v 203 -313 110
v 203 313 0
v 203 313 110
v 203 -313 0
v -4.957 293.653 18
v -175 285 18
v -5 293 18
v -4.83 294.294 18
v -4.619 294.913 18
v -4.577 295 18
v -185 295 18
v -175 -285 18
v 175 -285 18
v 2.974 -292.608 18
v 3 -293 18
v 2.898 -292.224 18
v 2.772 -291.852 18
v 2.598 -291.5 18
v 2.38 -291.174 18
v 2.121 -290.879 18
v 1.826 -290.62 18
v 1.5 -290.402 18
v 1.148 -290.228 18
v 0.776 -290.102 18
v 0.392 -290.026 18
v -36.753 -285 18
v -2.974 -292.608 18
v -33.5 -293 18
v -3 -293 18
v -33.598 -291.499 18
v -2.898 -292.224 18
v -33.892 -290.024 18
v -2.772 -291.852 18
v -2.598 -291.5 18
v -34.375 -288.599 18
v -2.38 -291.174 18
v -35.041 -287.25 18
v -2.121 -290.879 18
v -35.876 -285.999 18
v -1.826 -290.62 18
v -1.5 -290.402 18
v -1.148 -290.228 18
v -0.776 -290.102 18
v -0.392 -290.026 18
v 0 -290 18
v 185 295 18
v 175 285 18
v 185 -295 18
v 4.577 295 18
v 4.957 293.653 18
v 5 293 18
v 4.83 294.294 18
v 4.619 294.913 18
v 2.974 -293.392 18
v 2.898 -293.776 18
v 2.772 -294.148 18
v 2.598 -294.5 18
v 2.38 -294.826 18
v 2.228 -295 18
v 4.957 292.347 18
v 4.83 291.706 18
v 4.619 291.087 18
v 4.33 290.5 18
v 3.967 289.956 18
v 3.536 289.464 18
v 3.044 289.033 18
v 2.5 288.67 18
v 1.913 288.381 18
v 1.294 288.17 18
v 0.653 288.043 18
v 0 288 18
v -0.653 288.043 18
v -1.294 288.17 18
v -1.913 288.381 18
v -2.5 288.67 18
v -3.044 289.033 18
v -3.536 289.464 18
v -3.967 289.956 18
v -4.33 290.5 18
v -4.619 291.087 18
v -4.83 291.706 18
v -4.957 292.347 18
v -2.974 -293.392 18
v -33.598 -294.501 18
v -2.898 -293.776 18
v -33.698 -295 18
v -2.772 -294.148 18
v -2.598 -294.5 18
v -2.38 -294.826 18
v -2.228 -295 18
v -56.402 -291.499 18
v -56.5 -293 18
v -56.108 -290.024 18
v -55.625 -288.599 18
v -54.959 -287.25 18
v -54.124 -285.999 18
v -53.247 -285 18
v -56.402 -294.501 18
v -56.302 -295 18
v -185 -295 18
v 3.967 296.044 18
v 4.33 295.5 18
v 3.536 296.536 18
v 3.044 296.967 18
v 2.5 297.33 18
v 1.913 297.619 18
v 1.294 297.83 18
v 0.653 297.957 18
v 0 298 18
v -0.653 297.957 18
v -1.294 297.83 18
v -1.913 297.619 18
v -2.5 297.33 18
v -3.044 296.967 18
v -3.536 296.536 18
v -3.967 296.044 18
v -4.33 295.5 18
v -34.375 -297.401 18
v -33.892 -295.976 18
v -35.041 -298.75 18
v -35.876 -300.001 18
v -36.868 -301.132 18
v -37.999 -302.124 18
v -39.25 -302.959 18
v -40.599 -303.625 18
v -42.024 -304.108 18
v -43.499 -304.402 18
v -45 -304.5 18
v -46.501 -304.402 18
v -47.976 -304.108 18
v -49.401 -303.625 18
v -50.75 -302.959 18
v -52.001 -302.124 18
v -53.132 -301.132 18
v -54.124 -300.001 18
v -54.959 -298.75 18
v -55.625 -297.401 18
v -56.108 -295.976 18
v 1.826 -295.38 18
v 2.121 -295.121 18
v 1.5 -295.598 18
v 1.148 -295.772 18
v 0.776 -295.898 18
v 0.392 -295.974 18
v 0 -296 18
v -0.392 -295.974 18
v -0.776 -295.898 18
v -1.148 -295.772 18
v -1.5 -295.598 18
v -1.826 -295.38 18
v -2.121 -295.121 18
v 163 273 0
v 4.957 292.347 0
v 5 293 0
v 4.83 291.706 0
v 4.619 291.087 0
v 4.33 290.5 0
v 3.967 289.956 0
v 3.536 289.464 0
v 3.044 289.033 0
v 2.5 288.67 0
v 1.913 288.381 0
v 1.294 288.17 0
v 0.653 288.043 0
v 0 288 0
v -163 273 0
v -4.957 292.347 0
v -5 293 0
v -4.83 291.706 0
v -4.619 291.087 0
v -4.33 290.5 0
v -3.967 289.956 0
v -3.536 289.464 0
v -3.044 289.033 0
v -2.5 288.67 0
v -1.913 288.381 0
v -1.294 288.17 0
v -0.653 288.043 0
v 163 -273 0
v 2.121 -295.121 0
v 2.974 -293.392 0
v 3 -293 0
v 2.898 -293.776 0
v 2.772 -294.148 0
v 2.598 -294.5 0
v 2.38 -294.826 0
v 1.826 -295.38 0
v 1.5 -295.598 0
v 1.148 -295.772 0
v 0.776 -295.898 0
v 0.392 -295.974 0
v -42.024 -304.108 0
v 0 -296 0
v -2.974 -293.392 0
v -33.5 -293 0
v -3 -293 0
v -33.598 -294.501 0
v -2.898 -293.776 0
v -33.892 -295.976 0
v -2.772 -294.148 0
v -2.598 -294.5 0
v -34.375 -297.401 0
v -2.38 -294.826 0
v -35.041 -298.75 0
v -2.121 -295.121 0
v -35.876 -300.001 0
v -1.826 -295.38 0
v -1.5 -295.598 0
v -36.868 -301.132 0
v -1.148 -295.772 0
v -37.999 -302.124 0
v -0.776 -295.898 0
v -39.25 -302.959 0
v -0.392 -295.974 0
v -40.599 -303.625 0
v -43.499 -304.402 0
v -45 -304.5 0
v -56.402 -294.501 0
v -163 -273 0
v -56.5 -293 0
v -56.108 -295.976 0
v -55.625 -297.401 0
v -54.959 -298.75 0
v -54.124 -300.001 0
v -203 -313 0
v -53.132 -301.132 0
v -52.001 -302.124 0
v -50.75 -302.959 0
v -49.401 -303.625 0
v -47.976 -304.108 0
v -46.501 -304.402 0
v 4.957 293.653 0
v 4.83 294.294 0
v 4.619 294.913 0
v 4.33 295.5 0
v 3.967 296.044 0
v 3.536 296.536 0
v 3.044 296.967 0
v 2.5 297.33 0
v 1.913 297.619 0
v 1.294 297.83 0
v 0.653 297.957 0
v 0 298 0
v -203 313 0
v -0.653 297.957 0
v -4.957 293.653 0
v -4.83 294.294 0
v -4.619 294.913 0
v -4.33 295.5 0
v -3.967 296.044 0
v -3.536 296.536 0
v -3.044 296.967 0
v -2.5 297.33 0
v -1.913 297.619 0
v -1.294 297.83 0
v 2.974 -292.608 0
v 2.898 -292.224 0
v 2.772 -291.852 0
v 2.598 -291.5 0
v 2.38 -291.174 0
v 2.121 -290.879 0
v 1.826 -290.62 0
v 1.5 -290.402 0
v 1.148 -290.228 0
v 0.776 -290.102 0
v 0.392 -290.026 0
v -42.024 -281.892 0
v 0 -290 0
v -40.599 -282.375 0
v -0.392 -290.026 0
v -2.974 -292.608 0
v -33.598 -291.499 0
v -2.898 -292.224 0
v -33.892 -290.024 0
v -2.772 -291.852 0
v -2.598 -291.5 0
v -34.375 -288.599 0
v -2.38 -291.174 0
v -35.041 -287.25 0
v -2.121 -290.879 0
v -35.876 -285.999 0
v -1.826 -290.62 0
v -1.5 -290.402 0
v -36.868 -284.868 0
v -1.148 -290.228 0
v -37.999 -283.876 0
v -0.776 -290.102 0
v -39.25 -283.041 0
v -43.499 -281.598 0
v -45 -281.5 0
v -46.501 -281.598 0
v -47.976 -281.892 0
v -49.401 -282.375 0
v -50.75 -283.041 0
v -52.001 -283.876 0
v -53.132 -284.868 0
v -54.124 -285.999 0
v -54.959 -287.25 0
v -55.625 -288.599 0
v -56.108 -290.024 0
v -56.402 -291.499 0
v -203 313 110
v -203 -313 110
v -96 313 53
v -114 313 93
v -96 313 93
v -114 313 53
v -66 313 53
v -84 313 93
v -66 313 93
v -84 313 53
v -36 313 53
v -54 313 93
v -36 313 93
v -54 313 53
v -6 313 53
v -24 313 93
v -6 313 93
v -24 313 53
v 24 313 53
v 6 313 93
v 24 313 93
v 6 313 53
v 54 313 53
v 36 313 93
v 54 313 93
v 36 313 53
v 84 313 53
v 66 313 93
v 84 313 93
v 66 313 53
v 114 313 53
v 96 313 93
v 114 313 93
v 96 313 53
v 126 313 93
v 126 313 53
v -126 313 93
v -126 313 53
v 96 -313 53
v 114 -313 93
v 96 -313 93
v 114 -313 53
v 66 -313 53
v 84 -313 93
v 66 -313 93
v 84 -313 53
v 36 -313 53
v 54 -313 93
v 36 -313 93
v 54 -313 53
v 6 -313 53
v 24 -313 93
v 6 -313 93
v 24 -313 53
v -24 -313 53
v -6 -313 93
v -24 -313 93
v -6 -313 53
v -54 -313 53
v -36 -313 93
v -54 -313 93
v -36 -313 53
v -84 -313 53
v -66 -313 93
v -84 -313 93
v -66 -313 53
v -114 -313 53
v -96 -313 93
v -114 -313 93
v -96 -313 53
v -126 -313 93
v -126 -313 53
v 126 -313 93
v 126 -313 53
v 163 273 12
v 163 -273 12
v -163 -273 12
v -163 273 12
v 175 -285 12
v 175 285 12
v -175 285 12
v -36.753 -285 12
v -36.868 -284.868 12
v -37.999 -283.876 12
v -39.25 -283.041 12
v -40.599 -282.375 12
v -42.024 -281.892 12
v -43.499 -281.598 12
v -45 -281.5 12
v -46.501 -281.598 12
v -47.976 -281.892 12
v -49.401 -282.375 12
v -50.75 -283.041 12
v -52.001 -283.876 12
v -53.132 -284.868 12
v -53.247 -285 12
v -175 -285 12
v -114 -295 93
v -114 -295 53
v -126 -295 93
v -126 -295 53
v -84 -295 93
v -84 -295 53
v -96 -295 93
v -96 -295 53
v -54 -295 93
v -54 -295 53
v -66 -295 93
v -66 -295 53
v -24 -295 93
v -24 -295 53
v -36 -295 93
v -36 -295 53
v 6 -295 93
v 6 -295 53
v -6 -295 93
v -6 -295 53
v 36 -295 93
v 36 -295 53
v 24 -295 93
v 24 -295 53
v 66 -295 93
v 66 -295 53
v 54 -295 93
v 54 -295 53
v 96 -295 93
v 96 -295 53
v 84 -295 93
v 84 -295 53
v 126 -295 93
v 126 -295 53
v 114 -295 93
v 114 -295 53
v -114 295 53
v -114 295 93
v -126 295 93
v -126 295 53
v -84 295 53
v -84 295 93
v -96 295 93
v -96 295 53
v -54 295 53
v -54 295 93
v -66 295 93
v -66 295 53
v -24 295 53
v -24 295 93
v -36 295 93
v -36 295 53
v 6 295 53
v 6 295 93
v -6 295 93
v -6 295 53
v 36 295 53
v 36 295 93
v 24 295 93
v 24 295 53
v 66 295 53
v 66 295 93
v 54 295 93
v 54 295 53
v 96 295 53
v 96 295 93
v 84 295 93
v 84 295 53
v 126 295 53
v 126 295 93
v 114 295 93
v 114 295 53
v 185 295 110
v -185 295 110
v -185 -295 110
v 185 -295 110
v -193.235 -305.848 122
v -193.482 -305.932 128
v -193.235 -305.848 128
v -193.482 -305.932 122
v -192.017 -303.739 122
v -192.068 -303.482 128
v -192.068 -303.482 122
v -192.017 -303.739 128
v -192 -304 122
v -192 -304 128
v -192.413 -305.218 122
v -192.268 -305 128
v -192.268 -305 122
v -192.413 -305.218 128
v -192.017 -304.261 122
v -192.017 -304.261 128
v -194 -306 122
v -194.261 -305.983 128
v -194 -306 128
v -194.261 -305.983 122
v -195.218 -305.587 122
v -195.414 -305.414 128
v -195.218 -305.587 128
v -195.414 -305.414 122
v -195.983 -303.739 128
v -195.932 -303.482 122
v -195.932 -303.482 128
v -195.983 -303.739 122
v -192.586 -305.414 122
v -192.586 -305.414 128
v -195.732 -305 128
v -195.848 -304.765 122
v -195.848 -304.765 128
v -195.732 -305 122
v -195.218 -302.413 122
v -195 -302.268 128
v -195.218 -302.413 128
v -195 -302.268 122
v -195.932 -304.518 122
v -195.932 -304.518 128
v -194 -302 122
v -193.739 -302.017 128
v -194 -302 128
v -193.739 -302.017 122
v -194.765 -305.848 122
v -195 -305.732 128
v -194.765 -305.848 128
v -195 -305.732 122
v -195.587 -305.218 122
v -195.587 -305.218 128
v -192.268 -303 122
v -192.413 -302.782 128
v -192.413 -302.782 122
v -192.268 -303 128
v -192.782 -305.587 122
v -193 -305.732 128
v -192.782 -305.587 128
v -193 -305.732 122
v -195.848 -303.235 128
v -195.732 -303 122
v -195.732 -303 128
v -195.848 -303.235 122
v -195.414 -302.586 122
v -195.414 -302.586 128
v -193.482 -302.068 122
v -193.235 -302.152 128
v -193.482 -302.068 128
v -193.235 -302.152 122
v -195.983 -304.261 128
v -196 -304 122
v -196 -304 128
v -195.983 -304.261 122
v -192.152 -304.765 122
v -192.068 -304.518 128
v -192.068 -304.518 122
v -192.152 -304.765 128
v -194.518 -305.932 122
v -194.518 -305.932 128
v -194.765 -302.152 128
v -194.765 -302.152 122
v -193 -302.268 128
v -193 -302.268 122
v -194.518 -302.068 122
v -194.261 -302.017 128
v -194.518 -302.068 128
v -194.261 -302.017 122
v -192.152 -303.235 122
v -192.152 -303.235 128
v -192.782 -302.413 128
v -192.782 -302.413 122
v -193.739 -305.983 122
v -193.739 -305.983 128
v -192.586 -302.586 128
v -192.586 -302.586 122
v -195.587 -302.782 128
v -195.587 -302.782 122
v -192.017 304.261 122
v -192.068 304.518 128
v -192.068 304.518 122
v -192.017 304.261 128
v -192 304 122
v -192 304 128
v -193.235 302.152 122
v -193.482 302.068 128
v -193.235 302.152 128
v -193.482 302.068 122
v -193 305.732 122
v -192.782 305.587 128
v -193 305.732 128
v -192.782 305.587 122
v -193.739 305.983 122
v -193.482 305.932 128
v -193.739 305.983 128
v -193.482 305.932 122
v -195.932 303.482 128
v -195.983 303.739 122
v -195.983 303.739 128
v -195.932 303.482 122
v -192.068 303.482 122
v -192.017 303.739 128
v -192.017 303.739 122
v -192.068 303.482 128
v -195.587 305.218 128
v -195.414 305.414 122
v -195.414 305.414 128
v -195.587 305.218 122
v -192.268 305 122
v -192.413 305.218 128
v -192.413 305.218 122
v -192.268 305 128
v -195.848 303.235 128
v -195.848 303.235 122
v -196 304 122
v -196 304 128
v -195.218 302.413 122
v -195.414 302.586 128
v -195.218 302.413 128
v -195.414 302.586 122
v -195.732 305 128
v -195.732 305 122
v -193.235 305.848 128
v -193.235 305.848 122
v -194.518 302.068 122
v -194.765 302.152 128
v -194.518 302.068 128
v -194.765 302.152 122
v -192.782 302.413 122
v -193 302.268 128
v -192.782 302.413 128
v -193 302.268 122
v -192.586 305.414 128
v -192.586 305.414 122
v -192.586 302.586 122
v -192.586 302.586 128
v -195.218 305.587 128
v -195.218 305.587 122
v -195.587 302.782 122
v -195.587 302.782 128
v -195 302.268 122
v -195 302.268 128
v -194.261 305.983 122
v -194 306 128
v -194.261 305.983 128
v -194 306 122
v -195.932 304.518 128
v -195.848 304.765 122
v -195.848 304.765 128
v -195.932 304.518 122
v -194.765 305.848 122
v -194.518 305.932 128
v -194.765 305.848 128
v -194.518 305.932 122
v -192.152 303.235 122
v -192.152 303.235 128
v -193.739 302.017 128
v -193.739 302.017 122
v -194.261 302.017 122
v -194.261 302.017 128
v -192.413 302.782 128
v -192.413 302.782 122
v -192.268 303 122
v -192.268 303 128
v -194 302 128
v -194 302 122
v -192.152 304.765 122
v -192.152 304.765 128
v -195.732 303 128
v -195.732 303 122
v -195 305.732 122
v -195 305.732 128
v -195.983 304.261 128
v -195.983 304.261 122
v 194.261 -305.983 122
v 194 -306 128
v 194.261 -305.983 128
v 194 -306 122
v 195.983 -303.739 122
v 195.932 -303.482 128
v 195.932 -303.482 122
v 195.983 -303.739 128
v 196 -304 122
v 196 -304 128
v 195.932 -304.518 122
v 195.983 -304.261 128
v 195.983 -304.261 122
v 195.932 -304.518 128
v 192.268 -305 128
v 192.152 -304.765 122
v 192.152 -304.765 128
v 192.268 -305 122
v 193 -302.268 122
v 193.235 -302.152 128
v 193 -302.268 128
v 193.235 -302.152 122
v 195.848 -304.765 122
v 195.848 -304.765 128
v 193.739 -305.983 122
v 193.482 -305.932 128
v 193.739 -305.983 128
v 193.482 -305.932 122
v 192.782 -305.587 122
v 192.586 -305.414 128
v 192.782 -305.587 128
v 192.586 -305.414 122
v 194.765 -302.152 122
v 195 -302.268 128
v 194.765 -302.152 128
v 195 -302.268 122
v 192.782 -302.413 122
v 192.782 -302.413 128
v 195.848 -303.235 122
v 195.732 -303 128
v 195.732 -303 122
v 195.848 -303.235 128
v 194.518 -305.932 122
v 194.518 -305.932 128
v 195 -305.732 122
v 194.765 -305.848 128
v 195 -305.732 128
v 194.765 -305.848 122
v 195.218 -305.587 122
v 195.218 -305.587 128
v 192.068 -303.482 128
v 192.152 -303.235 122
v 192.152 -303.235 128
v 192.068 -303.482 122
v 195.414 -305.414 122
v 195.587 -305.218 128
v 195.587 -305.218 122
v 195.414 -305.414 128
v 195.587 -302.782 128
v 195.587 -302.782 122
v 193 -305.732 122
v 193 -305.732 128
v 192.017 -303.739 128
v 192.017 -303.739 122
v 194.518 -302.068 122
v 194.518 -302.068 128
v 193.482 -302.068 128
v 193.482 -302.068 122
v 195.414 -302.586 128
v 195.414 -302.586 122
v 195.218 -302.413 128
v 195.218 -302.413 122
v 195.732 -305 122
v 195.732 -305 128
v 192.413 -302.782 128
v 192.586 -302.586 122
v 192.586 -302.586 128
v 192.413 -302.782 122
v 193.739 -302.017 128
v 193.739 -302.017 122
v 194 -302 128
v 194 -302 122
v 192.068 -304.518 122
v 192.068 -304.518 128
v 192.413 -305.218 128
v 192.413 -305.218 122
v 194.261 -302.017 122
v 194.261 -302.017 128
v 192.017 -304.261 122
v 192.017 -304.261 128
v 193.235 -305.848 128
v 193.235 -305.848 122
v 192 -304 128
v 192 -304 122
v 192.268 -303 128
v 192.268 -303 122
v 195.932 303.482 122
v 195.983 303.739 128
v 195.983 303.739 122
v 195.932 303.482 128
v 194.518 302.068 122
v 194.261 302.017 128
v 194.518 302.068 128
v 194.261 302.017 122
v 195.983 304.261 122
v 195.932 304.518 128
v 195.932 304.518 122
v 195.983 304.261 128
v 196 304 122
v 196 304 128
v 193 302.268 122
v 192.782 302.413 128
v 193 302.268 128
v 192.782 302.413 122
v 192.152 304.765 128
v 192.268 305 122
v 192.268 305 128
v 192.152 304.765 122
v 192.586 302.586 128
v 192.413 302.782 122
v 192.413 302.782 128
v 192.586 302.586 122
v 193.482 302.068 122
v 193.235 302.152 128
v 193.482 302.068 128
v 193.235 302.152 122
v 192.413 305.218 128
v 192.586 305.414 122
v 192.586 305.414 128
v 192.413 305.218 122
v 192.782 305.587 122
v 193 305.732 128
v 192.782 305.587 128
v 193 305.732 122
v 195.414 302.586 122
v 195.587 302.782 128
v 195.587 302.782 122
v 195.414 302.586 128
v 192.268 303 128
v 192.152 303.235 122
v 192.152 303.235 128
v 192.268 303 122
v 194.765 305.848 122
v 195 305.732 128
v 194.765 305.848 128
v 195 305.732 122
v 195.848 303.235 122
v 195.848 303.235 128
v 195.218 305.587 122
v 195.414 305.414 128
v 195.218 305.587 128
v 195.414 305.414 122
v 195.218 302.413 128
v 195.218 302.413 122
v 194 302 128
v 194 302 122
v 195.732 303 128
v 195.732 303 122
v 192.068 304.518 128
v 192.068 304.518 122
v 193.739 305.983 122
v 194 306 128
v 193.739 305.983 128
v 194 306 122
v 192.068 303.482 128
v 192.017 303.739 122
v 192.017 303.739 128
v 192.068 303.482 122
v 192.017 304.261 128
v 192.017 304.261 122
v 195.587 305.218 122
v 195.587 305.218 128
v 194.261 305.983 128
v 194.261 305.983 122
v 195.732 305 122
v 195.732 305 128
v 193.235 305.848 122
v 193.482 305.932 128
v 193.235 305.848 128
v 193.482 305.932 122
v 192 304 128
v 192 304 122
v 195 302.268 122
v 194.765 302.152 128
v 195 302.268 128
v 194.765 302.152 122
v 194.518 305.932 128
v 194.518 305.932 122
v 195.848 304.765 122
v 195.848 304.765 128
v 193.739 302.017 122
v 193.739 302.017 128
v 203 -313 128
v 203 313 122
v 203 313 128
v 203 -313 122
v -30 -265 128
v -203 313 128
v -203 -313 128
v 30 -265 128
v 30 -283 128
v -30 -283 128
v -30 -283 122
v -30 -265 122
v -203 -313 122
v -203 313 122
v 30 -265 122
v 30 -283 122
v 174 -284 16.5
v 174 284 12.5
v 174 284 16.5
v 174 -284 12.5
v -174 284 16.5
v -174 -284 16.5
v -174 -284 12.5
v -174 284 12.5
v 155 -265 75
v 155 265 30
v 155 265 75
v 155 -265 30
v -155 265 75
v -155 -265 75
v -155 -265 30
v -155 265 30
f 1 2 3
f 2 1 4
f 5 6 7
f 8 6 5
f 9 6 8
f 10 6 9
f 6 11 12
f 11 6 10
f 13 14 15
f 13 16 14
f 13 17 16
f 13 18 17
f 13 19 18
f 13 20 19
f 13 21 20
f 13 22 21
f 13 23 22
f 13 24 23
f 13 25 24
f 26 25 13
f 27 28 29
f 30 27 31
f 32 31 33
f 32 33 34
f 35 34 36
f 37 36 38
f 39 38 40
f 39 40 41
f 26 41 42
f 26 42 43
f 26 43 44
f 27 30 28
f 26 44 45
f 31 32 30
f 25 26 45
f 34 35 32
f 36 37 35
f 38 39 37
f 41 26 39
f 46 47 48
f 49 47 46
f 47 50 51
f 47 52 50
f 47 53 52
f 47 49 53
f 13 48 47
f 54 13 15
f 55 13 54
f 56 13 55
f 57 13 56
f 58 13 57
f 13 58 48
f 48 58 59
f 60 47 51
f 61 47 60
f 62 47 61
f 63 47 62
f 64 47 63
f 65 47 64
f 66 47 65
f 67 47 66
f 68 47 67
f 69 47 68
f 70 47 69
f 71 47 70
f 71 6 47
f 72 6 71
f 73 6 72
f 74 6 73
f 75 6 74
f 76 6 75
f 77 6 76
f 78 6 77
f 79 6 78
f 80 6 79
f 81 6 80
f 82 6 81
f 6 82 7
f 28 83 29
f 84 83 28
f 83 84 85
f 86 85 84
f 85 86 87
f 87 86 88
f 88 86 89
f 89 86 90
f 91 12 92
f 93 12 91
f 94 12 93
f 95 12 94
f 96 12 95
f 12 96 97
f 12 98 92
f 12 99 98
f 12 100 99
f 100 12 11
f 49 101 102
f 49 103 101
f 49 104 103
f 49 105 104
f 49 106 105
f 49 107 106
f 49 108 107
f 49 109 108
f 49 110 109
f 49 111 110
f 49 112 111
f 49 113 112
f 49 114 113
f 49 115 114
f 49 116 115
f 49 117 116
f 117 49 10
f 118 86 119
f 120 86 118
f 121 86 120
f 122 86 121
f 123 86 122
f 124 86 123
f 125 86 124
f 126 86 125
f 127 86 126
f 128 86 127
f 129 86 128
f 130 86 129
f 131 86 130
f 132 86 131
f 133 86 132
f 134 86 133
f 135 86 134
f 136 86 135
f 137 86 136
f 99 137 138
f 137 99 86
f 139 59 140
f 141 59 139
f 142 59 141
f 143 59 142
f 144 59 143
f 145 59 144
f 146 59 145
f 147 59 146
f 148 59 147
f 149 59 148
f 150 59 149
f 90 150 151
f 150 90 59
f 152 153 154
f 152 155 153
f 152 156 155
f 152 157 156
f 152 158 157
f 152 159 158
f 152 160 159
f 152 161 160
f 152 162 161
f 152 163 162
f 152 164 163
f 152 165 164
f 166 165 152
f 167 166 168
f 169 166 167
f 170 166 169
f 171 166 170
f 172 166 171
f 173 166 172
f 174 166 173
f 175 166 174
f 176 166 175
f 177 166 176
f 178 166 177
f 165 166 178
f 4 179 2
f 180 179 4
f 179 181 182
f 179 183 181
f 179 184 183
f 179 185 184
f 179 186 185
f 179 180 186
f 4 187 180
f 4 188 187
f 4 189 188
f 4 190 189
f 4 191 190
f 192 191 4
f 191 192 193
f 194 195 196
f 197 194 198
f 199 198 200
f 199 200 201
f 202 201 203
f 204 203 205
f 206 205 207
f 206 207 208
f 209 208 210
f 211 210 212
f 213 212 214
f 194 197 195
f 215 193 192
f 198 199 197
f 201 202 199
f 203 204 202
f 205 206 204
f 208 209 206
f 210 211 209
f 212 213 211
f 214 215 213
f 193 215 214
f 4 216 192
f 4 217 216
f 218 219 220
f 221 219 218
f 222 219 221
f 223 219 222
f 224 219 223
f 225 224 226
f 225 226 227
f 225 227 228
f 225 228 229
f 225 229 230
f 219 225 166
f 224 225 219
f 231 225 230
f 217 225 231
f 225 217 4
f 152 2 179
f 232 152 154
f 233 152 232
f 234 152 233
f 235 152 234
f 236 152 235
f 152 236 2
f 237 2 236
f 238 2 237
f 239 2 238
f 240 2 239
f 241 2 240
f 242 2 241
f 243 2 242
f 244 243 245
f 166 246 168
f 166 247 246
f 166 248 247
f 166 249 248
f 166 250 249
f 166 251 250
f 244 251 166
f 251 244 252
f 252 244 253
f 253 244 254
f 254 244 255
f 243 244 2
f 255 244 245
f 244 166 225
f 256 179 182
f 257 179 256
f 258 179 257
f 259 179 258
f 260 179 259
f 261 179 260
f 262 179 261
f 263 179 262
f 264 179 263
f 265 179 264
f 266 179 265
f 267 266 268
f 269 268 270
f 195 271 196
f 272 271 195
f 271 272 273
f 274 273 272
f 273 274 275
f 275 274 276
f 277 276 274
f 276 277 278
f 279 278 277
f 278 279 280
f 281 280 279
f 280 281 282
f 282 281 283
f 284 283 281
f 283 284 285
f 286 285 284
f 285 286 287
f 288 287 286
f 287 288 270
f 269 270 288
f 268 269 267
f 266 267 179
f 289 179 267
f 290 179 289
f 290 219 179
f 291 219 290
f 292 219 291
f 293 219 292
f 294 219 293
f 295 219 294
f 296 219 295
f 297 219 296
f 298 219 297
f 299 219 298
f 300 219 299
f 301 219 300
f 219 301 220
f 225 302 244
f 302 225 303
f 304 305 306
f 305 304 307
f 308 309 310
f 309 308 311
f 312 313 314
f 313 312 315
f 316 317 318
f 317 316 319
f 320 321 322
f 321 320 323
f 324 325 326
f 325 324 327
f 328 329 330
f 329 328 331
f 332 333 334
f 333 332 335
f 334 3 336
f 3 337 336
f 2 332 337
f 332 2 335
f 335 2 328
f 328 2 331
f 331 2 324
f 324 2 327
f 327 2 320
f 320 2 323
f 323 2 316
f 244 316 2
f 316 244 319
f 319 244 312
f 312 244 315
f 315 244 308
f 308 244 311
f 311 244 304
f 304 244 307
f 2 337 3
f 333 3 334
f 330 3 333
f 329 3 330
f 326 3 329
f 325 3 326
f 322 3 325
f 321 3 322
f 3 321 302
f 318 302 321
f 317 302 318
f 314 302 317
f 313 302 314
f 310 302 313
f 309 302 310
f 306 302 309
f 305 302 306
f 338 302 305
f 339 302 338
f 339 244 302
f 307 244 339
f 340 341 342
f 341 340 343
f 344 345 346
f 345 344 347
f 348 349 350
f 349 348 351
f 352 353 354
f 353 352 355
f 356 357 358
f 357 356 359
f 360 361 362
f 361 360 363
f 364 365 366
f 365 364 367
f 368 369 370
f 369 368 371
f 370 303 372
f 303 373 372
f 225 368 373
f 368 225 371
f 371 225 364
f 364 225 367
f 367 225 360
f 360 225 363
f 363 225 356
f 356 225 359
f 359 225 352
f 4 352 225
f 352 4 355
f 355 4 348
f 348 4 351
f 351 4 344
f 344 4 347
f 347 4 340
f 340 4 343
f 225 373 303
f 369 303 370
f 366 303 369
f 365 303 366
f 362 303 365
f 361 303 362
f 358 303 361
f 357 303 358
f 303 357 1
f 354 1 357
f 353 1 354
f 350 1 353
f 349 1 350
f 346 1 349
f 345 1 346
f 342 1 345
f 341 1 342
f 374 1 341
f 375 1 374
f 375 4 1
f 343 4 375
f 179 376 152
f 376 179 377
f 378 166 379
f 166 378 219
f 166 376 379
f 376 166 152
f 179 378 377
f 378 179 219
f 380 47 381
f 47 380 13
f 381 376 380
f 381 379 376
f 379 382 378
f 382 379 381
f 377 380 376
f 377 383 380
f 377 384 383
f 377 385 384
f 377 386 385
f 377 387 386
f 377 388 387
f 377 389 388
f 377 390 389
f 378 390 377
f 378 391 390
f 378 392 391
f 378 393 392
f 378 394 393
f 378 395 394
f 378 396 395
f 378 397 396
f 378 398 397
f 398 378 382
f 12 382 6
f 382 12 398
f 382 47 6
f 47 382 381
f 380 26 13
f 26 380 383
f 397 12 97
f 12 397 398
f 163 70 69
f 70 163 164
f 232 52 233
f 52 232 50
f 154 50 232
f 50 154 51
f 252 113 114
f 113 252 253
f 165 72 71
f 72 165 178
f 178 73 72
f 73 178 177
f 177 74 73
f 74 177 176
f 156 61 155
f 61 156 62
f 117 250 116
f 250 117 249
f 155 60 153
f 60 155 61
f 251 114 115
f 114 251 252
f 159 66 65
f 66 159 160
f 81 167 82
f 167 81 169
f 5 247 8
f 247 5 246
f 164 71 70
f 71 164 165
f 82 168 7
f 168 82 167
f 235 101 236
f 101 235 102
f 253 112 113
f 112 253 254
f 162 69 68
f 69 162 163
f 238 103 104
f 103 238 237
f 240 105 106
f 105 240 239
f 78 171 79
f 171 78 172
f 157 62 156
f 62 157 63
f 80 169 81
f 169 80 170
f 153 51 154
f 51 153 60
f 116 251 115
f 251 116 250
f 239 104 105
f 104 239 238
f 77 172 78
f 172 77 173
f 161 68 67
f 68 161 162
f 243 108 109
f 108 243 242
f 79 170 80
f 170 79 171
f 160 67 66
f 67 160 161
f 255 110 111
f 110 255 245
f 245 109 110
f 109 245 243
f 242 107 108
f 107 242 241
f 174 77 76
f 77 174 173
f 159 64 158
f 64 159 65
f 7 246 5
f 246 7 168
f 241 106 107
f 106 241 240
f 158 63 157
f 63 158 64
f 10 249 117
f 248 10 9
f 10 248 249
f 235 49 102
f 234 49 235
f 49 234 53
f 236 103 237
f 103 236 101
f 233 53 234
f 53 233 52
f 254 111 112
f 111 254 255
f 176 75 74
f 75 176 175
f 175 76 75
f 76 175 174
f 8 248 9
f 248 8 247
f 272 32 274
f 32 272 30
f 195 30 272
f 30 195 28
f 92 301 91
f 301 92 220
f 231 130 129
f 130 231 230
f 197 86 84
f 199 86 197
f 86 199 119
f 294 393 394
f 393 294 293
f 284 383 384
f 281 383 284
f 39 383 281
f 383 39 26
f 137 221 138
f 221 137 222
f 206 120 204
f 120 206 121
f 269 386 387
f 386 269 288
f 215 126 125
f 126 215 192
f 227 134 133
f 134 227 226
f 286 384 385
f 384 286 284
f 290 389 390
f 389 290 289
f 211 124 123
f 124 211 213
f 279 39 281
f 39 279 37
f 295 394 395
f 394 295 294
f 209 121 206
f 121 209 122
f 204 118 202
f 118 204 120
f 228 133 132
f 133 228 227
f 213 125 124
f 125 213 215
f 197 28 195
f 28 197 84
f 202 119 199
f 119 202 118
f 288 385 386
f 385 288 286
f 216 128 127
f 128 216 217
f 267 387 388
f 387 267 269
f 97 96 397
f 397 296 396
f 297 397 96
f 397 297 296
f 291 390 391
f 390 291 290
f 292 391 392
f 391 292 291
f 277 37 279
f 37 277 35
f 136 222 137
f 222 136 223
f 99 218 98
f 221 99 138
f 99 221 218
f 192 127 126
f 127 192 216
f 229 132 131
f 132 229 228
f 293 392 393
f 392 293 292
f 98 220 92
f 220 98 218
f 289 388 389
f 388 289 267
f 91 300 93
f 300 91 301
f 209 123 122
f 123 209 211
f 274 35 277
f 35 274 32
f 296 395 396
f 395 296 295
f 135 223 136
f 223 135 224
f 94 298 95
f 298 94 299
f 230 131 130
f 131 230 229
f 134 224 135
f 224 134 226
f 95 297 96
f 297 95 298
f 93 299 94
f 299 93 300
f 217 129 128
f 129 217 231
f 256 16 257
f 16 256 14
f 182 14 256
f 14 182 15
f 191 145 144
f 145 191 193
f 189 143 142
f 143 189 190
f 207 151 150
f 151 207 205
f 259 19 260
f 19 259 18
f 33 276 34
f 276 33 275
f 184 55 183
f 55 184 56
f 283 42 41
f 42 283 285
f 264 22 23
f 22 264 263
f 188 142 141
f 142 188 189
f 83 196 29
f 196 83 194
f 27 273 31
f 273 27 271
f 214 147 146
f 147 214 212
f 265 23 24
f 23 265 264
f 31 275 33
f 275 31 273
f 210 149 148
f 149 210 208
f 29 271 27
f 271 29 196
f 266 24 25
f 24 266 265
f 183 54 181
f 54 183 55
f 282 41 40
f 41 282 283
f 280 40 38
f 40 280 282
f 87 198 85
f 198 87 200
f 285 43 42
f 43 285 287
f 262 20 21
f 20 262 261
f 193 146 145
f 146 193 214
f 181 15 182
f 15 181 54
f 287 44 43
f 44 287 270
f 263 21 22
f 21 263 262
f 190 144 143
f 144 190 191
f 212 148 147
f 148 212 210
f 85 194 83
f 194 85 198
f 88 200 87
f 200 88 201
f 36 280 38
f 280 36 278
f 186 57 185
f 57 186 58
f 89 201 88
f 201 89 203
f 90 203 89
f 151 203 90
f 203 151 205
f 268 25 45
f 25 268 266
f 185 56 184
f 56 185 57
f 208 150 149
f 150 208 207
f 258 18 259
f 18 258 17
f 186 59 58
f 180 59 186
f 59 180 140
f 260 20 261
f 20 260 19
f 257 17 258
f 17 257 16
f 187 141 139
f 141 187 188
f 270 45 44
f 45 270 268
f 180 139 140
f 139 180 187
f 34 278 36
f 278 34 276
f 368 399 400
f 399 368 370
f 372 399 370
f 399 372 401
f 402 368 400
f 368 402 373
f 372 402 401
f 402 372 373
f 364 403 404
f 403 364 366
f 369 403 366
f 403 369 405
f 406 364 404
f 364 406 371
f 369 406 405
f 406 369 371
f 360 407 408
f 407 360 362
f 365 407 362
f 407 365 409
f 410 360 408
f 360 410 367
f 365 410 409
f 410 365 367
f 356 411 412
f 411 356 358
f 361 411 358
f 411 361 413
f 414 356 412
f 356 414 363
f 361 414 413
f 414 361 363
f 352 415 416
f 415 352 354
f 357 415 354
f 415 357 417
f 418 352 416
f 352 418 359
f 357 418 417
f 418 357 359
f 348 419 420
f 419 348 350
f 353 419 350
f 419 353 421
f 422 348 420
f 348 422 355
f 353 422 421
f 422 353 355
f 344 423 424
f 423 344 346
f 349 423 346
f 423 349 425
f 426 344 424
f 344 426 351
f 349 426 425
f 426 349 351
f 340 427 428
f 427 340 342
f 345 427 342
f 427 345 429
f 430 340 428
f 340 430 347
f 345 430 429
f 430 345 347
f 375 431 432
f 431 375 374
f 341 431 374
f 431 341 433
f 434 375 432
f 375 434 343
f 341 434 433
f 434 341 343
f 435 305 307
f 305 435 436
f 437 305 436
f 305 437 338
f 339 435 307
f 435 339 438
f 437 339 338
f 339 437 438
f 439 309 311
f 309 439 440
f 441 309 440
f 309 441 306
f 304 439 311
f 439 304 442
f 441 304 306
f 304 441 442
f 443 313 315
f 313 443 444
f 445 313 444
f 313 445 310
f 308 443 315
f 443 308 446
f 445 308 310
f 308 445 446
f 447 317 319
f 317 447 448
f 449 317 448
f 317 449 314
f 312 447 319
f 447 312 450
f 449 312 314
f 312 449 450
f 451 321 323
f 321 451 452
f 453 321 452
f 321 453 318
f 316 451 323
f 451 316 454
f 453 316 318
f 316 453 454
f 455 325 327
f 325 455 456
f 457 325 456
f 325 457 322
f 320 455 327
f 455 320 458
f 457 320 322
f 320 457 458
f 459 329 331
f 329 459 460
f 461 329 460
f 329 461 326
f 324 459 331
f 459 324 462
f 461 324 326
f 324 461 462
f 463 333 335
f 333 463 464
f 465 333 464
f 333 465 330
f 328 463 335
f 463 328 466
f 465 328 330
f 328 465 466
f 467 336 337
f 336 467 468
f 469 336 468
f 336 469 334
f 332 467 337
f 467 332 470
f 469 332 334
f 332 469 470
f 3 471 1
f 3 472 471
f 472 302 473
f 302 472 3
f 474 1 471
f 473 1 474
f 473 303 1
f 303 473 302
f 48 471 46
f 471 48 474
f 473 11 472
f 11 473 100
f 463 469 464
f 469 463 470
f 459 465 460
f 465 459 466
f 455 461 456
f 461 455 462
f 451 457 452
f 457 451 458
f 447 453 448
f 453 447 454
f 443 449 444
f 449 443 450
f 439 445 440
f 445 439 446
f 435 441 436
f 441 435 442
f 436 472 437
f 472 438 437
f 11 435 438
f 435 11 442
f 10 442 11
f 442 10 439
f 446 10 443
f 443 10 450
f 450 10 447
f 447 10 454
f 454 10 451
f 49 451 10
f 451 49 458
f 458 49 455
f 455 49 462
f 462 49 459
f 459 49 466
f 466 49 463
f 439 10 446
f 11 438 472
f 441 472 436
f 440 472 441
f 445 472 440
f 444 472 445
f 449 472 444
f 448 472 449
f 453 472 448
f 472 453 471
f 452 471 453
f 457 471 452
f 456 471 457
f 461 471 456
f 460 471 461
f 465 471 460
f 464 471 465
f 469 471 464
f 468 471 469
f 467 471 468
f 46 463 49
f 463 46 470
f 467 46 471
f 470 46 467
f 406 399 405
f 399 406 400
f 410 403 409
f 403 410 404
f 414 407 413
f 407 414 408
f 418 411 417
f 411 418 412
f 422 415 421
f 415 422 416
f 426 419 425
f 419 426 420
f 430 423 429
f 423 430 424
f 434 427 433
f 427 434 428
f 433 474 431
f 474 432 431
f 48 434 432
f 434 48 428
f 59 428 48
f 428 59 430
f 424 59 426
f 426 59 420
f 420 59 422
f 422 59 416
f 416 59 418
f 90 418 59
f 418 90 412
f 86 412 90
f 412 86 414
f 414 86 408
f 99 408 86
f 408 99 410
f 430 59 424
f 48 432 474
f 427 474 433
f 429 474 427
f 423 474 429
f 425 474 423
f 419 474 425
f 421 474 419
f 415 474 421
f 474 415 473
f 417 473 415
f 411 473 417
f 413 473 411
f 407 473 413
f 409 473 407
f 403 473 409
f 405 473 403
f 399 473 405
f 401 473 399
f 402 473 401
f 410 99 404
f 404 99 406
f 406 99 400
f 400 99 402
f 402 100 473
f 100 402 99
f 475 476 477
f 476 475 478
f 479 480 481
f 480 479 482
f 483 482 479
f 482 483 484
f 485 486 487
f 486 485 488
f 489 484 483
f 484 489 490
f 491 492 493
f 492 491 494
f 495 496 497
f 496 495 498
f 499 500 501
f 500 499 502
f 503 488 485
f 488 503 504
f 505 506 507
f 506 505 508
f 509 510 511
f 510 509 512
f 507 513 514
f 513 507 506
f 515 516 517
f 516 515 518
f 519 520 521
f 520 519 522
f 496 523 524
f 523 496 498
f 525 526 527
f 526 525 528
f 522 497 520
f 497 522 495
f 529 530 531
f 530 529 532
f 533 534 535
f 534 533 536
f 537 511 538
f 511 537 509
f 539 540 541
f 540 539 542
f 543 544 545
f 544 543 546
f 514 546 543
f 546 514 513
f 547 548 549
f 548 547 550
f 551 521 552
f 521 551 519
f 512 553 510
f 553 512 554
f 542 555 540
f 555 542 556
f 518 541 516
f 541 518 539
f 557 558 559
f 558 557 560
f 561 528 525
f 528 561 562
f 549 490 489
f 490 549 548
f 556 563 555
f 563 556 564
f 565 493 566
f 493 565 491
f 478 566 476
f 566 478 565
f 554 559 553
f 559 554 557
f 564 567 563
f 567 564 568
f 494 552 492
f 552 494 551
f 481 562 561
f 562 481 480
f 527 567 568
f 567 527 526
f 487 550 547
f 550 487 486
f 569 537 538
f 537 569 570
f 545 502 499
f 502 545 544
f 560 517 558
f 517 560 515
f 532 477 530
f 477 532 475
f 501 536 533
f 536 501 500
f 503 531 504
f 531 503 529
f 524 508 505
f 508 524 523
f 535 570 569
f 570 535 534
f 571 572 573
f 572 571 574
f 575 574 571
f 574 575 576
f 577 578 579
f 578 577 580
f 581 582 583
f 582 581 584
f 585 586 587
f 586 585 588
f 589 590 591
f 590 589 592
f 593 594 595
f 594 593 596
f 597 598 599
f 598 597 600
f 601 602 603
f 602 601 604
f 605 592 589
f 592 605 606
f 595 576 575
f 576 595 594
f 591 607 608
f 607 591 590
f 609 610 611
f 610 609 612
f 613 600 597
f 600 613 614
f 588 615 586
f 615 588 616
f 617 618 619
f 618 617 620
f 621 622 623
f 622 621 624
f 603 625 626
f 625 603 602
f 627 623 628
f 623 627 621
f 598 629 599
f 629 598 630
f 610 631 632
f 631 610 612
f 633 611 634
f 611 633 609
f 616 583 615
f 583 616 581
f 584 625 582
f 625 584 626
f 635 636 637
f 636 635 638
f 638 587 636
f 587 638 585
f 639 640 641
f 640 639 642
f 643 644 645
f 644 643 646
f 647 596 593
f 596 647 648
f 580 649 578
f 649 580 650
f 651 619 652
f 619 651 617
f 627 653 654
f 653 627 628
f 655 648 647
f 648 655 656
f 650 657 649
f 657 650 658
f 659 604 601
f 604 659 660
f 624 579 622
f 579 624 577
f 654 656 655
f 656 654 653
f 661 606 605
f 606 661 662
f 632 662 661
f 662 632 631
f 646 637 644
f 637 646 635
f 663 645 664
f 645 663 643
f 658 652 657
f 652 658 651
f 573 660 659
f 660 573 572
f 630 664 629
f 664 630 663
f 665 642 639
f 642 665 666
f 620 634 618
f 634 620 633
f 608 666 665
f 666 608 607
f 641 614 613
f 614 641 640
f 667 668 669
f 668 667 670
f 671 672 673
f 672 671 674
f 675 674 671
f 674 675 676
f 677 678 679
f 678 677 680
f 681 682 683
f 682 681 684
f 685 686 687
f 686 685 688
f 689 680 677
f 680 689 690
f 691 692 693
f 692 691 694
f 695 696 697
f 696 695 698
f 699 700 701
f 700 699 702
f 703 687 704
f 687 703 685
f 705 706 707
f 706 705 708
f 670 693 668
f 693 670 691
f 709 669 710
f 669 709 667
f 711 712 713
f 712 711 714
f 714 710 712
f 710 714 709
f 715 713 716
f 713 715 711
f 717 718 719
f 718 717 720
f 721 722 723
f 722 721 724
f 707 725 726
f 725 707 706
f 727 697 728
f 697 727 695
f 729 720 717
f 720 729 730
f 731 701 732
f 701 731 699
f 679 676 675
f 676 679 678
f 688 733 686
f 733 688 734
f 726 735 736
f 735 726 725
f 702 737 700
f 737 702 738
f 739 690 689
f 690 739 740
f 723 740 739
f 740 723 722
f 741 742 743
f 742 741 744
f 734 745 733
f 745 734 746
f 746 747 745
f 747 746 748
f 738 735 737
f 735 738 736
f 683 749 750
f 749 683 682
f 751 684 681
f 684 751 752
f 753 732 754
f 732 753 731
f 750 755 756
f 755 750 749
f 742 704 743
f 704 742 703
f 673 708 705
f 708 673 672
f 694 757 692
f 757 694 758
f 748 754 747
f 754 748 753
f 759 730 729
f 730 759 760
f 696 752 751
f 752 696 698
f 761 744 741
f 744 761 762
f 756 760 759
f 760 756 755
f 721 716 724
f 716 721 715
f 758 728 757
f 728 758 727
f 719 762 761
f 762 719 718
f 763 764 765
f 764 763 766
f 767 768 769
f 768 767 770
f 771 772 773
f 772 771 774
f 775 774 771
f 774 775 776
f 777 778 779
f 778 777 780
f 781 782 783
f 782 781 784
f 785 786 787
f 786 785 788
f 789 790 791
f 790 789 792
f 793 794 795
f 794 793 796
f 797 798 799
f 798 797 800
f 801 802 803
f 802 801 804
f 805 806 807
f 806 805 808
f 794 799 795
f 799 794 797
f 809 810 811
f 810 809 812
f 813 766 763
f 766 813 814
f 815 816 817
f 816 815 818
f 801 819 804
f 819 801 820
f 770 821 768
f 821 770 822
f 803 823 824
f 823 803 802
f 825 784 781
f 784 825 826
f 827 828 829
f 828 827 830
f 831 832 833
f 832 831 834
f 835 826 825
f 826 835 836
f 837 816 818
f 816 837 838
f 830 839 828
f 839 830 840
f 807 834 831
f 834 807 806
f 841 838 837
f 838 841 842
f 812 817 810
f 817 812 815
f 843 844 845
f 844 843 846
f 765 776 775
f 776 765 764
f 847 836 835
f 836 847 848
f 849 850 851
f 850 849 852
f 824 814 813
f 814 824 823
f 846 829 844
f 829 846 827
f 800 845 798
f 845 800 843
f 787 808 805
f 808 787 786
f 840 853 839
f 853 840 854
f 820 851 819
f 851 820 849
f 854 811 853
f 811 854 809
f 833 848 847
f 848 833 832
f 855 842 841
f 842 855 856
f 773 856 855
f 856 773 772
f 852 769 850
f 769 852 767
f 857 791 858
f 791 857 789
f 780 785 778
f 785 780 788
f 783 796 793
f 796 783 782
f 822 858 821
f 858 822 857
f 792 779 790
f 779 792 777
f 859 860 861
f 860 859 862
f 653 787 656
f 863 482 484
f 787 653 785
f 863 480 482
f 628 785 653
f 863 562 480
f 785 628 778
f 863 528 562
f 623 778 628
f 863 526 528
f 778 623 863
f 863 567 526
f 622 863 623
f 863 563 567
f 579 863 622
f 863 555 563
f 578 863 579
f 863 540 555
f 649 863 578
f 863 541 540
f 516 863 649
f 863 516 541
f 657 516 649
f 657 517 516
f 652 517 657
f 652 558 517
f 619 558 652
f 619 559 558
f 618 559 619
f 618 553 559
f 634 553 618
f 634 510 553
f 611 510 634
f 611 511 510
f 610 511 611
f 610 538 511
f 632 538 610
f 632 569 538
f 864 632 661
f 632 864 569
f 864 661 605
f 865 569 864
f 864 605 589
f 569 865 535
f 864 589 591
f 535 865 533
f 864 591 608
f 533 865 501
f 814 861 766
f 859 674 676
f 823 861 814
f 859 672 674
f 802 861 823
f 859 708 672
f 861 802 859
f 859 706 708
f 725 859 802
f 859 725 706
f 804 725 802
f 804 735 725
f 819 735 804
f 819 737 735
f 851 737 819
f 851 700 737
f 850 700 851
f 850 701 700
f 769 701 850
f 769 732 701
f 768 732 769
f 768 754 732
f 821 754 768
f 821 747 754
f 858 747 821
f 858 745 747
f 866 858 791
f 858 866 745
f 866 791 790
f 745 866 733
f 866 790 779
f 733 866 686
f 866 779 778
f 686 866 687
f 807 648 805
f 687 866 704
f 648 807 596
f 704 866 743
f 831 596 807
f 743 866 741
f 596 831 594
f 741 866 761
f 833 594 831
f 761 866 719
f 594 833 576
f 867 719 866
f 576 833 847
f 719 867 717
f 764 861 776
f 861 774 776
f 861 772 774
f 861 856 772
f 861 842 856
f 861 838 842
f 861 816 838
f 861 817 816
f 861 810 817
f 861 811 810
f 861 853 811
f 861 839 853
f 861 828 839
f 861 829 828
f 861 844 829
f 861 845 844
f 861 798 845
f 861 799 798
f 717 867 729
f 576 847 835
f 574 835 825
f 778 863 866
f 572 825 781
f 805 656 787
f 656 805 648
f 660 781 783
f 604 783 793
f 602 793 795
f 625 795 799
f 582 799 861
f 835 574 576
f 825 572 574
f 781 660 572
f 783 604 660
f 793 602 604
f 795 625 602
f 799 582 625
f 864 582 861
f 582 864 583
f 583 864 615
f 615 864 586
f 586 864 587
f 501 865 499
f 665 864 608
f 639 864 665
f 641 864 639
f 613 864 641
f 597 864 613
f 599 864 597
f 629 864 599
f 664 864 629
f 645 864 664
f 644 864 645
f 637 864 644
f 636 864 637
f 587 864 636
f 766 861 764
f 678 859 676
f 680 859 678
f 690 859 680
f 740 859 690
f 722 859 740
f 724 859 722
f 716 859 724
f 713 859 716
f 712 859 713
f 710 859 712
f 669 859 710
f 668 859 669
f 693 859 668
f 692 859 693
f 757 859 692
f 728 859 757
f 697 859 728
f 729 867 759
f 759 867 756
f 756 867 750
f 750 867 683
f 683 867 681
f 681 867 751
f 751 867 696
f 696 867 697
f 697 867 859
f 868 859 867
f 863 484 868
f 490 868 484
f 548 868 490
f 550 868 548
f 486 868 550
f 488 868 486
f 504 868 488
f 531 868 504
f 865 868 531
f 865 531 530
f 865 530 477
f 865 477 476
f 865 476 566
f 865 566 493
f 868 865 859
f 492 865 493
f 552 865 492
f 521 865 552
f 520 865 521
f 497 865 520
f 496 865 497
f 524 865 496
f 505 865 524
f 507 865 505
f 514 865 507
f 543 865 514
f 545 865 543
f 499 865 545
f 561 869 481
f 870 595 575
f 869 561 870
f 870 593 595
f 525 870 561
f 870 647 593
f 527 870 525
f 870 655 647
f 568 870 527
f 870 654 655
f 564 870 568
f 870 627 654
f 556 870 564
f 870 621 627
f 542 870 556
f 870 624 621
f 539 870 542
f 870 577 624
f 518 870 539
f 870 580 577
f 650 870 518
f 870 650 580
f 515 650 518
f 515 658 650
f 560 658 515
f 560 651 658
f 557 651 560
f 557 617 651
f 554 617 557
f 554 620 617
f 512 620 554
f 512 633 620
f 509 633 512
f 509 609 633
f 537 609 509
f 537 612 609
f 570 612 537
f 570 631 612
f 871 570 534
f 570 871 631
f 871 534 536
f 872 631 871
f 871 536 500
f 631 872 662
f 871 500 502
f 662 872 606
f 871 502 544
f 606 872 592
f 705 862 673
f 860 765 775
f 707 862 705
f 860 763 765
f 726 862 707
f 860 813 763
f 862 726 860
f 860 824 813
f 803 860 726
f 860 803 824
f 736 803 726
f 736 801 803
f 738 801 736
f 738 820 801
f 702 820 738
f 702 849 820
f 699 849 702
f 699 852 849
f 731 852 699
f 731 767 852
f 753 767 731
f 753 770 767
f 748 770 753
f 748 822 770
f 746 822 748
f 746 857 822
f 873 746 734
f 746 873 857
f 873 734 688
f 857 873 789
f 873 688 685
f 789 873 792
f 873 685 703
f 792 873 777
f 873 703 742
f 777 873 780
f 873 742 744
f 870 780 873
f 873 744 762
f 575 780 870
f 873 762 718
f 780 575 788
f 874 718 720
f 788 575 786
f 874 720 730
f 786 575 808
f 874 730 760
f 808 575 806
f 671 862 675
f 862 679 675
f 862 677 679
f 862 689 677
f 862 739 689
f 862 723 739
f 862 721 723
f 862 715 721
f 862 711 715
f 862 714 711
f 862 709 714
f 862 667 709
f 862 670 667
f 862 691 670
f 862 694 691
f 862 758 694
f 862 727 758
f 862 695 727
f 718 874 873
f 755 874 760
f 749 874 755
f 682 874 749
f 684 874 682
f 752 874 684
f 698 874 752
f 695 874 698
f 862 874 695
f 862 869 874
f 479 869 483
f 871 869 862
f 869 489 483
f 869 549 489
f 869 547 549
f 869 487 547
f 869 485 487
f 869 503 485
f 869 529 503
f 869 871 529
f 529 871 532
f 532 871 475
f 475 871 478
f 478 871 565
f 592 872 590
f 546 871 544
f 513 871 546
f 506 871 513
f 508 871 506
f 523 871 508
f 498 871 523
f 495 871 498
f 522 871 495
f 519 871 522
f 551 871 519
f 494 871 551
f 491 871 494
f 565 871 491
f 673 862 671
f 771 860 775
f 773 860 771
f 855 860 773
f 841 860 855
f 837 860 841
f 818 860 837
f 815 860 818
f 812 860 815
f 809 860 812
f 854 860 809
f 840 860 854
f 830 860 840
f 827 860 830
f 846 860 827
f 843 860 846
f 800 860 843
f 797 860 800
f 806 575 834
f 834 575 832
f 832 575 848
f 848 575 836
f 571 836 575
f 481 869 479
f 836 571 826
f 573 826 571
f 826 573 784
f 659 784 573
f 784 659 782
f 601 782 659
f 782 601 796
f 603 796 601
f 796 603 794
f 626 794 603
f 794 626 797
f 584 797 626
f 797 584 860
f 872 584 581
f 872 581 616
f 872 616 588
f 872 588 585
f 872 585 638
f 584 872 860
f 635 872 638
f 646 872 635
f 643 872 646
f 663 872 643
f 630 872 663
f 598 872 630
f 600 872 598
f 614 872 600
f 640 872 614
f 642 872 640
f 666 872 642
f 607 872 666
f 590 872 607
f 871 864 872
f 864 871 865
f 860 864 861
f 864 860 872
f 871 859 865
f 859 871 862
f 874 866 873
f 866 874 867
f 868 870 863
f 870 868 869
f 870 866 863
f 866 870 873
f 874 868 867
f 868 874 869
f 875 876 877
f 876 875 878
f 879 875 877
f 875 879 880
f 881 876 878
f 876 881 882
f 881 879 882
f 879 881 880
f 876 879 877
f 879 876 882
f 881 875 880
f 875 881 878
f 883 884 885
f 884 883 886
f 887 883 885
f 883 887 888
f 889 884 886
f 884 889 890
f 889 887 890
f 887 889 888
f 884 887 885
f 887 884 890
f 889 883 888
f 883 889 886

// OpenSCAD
// Unidades em mm. Exemplo, conferir dimensões reais antes de fabricar.
// Não é peça estrutural certificada nem recomendação para imprimir a moldura.
// Abra no OpenSCAD. part: assembly, front, body, back, front2d.
part = "assembly";
monitor_w = 310; monitor_h = 530; monitor_d = 45;
clearance = 8; rail = 40; lip = 12;
front_t = 18; wall = 18; body_d = 92; back_t = 6;
glass_t = 4; rebate_d = 6;
opening_w = monitor_w + 2*clearance;
opening_h = monitor_h + 2*clearance;
outer_w = opening_w + 2*rail;
outer_h = opening_h + 2*rail;
glass_w = opening_w + 2*lip - 2;
glass_h = opening_h + 2*lip - 2;
$fn=48;
module front(){
  difference(){
    translate([-outer_w/2,-outer_h/2,0])cube([outer_w,outer_h,front_t]);
    translate([-opening_w/2,-opening_h/2,-1])cube([opening_w,opening_h,front_t+2]);
    translate([-(opening_w+2*lip)/2,-(opening_h+2*lip)/2,front_t-rebate_d])cube([opening_w+2*lip,opening_h+2*lip,rebate_d+1]);
    // Furos-guia: ajustar ao módulo e à lente antes de cortar.
    translate([0,outer_h/2-rail/2,-1])cylinder(h=front_t+2,d=10);
    translate([-45,-outer_h/2+rail/2,-1])cylinder(h=front_t+2,d=23);
    translate([0,-outer_h/2+rail/2,-1])cylinder(h=front_t+2,d=6);
  }
}
module body(){
  difference(){
    translate([-outer_w/2,-outer_h/2,0])cube([outer_w,outer_h,body_d]);
    translate([-outer_w/2+wall,-outer_h/2+wall,-1])cube([outer_w-2*wall,outer_h-2*wall,body_d+2]);
    // Aberturas nas paredes inferior e superior; acabamento com tela de proteção.
    for(y=[-outer_h/2-1,outer_h/2-wall-1])
      for(x=[-120:30:120])translate([x-6,y,35])cube([12,wall+2,40]);
  }
}
module back(){
  difference(){
    translate([-outer_w/2,-outer_h/2,0])cube([outer_w,outer_h,back_t]);
    translate([-30,-outer_h/2+30,-1])cube([60,18,back_t+2]); // passagem de cabos com prensa-cabo/borda
    for(x=[-outer_w/2+wall/2,outer_w/2-wall/2])
      for(y=[-outer_h/2+wall/2,outer_h/2-wall/2])translate([x,y,-1])cylinder(h=back_t+2,d=4);
  }
}
if(part=="front")front();
else if(part=="front2d")projection(cut=false)front();
else if(part=="body")body();
else if(part=="back")back();
else {
  color([.15,.18,.15])front();
  color([.5,.8,.9,.22])translate([-glass_w/2,-glass_h/2,front_t-rebate_d+.5])cube([glass_w,glass_h,glass_t]);
  color([.09,.09,.09])translate([-monitor_w/2,-monitor_h/2,front_t+12])cube([monitor_w,monitor_h,monitor_d]);
  color([.35,.25,.15,.35])translate([0,0,front_t])body();
  color([.2,.2,.2,.4])translate([0,0,front_t+body_d+12])back();
}
